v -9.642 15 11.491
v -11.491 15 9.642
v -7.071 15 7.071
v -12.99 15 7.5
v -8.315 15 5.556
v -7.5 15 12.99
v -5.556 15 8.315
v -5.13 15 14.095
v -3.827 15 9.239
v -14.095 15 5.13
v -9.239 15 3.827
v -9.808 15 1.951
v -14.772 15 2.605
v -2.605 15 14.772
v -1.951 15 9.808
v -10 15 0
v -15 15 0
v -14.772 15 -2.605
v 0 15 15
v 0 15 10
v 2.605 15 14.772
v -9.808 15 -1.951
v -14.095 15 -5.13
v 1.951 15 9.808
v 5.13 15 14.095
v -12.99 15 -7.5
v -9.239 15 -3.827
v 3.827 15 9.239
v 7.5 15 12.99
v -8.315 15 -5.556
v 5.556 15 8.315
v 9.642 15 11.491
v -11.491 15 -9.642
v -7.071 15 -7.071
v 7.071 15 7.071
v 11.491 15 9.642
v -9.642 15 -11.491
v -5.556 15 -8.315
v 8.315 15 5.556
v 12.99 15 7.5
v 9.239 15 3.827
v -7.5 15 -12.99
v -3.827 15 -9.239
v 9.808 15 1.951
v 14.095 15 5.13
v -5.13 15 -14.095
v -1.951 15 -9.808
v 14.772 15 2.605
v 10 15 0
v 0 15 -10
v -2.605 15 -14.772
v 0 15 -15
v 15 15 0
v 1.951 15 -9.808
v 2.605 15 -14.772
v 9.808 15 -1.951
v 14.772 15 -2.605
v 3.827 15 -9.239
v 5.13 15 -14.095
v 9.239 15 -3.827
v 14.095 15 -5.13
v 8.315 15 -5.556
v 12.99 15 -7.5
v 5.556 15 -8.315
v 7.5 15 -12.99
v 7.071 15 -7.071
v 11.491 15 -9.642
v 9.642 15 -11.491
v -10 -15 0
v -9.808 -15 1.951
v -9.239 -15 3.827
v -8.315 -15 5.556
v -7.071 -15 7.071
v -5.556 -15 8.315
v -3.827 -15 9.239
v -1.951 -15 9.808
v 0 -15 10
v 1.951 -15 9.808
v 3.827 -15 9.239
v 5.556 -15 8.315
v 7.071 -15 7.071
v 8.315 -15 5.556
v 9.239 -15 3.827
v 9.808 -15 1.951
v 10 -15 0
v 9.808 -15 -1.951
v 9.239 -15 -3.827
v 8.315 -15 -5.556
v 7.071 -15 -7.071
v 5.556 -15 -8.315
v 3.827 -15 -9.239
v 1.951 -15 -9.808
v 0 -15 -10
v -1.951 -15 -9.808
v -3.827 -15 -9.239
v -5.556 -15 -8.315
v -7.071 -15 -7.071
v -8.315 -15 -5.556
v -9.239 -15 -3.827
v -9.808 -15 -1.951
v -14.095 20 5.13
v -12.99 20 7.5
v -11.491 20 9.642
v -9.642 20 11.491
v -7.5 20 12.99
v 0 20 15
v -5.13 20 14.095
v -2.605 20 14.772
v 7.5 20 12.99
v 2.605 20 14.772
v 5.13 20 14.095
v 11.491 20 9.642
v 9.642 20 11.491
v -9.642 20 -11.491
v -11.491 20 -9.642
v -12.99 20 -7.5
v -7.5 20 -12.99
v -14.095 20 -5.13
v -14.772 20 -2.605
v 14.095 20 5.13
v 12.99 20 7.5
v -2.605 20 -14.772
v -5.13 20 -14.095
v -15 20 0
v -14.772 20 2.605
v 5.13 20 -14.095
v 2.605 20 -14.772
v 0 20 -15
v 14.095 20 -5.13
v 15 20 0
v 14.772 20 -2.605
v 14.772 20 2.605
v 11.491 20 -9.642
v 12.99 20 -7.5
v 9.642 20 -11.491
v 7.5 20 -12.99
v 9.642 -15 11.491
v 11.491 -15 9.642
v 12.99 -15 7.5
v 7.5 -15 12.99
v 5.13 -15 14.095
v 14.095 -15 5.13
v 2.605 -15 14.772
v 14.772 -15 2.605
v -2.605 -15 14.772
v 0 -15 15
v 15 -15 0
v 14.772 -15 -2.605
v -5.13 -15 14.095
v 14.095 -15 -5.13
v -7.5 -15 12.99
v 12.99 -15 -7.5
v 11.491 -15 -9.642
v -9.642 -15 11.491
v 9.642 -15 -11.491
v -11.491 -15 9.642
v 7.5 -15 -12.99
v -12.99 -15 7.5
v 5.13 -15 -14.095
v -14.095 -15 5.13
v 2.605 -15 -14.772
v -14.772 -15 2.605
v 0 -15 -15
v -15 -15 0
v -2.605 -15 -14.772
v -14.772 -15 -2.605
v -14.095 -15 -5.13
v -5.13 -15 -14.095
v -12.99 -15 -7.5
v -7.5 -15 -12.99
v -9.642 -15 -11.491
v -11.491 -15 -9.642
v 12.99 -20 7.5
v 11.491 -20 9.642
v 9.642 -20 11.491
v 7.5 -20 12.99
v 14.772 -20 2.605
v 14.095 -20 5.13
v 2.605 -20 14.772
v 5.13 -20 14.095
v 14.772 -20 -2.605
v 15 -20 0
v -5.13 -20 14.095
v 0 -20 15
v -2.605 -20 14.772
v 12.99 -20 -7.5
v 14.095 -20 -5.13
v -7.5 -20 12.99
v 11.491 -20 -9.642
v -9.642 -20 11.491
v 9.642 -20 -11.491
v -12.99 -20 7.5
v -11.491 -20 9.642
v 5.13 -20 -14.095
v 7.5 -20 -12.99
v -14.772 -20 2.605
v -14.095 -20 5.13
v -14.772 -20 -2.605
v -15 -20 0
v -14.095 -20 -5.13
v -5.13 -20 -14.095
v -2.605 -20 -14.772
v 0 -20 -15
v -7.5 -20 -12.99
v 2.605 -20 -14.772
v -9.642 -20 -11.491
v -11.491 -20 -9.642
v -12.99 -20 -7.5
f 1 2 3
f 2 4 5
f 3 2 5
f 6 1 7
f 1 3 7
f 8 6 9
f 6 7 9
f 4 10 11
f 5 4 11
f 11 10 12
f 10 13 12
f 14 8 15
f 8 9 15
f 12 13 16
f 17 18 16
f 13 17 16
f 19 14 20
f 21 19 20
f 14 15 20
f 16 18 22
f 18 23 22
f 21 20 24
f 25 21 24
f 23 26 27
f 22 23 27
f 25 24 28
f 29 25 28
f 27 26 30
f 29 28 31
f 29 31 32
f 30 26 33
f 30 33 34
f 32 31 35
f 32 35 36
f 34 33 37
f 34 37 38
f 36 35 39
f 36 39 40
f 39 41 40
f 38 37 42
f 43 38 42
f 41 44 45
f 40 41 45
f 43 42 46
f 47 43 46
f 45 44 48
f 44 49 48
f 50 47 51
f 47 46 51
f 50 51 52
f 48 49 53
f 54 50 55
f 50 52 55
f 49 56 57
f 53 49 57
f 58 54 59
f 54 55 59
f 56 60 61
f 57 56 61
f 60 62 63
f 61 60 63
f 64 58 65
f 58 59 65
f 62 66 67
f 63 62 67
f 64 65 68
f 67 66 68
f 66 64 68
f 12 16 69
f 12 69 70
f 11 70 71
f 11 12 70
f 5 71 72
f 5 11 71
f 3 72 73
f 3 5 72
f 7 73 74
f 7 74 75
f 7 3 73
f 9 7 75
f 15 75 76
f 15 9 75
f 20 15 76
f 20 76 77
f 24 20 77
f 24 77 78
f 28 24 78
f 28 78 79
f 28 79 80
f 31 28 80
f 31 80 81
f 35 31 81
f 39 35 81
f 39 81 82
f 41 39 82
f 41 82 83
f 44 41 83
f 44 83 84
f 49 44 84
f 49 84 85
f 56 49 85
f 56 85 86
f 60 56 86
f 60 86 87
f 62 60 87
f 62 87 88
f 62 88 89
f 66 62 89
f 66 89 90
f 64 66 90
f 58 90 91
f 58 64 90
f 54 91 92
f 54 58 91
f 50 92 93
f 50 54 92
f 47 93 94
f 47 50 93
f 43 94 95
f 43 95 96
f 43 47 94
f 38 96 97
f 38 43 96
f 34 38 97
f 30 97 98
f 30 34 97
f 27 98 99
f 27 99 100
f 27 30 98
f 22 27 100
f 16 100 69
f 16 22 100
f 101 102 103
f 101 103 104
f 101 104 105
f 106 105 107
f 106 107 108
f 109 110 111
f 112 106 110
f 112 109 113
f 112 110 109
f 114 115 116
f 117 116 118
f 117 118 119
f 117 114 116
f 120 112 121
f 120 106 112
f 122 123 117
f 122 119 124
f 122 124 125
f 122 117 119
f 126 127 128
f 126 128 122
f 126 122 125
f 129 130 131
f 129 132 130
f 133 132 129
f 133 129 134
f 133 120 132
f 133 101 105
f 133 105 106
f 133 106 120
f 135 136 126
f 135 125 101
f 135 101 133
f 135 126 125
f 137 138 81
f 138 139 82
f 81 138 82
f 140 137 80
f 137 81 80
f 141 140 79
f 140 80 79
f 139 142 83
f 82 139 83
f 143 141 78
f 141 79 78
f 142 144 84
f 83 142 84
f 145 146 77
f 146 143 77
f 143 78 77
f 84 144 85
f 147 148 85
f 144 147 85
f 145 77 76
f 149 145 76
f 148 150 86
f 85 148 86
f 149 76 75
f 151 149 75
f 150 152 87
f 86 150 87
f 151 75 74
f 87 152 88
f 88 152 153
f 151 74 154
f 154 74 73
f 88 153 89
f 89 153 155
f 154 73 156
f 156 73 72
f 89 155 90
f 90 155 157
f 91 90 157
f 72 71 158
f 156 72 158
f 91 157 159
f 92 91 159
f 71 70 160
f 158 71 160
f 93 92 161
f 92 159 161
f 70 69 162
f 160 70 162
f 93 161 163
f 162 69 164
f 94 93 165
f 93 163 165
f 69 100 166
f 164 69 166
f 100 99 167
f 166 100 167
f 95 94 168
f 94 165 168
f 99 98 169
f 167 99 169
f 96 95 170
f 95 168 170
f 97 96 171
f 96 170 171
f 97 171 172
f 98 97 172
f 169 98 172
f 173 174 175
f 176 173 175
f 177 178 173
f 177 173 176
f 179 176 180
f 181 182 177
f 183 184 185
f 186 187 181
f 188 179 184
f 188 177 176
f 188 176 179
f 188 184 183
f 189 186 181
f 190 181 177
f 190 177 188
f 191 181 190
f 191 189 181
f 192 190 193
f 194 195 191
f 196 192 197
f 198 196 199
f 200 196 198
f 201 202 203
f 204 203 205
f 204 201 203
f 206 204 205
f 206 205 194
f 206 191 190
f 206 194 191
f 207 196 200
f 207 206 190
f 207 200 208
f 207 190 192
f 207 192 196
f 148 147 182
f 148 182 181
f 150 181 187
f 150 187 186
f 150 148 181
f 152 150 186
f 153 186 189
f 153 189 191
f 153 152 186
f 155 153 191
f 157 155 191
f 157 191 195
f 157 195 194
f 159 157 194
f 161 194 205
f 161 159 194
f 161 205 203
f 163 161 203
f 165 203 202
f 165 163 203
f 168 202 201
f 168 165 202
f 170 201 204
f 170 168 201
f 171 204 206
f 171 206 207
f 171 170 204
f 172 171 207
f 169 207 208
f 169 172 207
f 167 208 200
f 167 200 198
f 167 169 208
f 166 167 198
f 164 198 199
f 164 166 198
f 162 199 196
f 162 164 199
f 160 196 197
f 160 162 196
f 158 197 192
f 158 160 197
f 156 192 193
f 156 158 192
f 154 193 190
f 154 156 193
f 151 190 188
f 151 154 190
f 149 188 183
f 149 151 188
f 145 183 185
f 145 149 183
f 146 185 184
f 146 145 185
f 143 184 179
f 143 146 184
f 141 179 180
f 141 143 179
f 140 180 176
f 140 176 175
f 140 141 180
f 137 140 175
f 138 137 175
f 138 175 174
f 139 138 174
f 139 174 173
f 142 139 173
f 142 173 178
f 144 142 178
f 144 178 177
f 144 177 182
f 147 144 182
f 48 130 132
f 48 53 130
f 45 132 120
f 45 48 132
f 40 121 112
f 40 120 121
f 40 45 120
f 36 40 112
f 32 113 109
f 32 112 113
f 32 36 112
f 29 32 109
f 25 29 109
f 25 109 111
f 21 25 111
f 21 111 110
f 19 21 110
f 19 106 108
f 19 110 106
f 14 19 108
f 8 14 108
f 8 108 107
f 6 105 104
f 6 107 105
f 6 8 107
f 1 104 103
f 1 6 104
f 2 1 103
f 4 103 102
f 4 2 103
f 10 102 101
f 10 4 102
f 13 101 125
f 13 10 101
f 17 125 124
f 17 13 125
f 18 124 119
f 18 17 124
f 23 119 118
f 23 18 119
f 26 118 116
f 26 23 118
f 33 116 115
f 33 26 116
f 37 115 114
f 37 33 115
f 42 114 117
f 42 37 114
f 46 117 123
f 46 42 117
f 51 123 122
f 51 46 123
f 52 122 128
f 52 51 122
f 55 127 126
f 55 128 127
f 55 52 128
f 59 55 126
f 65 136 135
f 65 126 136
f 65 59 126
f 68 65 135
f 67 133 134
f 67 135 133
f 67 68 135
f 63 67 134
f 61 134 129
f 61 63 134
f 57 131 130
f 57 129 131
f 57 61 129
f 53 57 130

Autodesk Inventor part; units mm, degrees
ref_plane "YZ Plane" through (0, 0, 0) normal (1, 0, 0) x (0, 1, 0)
ref_plane "XZ Plane" through (0, 0, 0) normal (0, 1, 0) x (-1, 0, 0)
ref_plane "XY Plane" through (0, 0, 0) normal (0, 0, 1) x (1, 0, 0)
sketch "Szkic1" plane through (0, 0, 0) normal (0, 1, 0) x (-1, 0, 0)
  circle A0 centre (0, 0) radius 10
  dimension "d0" = 20
extrude "Wyciągnięcie proste1" add sketch "Szkic1" along normal mid plane 30
sketch "Szkic2" plane through (0, 15, 0) normal (0, 1, 0) x (1, 0, 0)
  circle A0 centre (0, 0) radius 10 projected
  circle A1 centre (0, 0) radius 15
  dimension "d3" = 30
extrude "Wyciągnięcie proste2" add sketch "Szkic2" along normal blind 5 contours A0 | A1
mirror "Odbicie lustrzane1" about plane through (0, 0, 0) normal (0, 1, 0) of "Wyciągnięcie proste2"
properties part number "RevolvingConnector2" material "Aluminium 6061"
